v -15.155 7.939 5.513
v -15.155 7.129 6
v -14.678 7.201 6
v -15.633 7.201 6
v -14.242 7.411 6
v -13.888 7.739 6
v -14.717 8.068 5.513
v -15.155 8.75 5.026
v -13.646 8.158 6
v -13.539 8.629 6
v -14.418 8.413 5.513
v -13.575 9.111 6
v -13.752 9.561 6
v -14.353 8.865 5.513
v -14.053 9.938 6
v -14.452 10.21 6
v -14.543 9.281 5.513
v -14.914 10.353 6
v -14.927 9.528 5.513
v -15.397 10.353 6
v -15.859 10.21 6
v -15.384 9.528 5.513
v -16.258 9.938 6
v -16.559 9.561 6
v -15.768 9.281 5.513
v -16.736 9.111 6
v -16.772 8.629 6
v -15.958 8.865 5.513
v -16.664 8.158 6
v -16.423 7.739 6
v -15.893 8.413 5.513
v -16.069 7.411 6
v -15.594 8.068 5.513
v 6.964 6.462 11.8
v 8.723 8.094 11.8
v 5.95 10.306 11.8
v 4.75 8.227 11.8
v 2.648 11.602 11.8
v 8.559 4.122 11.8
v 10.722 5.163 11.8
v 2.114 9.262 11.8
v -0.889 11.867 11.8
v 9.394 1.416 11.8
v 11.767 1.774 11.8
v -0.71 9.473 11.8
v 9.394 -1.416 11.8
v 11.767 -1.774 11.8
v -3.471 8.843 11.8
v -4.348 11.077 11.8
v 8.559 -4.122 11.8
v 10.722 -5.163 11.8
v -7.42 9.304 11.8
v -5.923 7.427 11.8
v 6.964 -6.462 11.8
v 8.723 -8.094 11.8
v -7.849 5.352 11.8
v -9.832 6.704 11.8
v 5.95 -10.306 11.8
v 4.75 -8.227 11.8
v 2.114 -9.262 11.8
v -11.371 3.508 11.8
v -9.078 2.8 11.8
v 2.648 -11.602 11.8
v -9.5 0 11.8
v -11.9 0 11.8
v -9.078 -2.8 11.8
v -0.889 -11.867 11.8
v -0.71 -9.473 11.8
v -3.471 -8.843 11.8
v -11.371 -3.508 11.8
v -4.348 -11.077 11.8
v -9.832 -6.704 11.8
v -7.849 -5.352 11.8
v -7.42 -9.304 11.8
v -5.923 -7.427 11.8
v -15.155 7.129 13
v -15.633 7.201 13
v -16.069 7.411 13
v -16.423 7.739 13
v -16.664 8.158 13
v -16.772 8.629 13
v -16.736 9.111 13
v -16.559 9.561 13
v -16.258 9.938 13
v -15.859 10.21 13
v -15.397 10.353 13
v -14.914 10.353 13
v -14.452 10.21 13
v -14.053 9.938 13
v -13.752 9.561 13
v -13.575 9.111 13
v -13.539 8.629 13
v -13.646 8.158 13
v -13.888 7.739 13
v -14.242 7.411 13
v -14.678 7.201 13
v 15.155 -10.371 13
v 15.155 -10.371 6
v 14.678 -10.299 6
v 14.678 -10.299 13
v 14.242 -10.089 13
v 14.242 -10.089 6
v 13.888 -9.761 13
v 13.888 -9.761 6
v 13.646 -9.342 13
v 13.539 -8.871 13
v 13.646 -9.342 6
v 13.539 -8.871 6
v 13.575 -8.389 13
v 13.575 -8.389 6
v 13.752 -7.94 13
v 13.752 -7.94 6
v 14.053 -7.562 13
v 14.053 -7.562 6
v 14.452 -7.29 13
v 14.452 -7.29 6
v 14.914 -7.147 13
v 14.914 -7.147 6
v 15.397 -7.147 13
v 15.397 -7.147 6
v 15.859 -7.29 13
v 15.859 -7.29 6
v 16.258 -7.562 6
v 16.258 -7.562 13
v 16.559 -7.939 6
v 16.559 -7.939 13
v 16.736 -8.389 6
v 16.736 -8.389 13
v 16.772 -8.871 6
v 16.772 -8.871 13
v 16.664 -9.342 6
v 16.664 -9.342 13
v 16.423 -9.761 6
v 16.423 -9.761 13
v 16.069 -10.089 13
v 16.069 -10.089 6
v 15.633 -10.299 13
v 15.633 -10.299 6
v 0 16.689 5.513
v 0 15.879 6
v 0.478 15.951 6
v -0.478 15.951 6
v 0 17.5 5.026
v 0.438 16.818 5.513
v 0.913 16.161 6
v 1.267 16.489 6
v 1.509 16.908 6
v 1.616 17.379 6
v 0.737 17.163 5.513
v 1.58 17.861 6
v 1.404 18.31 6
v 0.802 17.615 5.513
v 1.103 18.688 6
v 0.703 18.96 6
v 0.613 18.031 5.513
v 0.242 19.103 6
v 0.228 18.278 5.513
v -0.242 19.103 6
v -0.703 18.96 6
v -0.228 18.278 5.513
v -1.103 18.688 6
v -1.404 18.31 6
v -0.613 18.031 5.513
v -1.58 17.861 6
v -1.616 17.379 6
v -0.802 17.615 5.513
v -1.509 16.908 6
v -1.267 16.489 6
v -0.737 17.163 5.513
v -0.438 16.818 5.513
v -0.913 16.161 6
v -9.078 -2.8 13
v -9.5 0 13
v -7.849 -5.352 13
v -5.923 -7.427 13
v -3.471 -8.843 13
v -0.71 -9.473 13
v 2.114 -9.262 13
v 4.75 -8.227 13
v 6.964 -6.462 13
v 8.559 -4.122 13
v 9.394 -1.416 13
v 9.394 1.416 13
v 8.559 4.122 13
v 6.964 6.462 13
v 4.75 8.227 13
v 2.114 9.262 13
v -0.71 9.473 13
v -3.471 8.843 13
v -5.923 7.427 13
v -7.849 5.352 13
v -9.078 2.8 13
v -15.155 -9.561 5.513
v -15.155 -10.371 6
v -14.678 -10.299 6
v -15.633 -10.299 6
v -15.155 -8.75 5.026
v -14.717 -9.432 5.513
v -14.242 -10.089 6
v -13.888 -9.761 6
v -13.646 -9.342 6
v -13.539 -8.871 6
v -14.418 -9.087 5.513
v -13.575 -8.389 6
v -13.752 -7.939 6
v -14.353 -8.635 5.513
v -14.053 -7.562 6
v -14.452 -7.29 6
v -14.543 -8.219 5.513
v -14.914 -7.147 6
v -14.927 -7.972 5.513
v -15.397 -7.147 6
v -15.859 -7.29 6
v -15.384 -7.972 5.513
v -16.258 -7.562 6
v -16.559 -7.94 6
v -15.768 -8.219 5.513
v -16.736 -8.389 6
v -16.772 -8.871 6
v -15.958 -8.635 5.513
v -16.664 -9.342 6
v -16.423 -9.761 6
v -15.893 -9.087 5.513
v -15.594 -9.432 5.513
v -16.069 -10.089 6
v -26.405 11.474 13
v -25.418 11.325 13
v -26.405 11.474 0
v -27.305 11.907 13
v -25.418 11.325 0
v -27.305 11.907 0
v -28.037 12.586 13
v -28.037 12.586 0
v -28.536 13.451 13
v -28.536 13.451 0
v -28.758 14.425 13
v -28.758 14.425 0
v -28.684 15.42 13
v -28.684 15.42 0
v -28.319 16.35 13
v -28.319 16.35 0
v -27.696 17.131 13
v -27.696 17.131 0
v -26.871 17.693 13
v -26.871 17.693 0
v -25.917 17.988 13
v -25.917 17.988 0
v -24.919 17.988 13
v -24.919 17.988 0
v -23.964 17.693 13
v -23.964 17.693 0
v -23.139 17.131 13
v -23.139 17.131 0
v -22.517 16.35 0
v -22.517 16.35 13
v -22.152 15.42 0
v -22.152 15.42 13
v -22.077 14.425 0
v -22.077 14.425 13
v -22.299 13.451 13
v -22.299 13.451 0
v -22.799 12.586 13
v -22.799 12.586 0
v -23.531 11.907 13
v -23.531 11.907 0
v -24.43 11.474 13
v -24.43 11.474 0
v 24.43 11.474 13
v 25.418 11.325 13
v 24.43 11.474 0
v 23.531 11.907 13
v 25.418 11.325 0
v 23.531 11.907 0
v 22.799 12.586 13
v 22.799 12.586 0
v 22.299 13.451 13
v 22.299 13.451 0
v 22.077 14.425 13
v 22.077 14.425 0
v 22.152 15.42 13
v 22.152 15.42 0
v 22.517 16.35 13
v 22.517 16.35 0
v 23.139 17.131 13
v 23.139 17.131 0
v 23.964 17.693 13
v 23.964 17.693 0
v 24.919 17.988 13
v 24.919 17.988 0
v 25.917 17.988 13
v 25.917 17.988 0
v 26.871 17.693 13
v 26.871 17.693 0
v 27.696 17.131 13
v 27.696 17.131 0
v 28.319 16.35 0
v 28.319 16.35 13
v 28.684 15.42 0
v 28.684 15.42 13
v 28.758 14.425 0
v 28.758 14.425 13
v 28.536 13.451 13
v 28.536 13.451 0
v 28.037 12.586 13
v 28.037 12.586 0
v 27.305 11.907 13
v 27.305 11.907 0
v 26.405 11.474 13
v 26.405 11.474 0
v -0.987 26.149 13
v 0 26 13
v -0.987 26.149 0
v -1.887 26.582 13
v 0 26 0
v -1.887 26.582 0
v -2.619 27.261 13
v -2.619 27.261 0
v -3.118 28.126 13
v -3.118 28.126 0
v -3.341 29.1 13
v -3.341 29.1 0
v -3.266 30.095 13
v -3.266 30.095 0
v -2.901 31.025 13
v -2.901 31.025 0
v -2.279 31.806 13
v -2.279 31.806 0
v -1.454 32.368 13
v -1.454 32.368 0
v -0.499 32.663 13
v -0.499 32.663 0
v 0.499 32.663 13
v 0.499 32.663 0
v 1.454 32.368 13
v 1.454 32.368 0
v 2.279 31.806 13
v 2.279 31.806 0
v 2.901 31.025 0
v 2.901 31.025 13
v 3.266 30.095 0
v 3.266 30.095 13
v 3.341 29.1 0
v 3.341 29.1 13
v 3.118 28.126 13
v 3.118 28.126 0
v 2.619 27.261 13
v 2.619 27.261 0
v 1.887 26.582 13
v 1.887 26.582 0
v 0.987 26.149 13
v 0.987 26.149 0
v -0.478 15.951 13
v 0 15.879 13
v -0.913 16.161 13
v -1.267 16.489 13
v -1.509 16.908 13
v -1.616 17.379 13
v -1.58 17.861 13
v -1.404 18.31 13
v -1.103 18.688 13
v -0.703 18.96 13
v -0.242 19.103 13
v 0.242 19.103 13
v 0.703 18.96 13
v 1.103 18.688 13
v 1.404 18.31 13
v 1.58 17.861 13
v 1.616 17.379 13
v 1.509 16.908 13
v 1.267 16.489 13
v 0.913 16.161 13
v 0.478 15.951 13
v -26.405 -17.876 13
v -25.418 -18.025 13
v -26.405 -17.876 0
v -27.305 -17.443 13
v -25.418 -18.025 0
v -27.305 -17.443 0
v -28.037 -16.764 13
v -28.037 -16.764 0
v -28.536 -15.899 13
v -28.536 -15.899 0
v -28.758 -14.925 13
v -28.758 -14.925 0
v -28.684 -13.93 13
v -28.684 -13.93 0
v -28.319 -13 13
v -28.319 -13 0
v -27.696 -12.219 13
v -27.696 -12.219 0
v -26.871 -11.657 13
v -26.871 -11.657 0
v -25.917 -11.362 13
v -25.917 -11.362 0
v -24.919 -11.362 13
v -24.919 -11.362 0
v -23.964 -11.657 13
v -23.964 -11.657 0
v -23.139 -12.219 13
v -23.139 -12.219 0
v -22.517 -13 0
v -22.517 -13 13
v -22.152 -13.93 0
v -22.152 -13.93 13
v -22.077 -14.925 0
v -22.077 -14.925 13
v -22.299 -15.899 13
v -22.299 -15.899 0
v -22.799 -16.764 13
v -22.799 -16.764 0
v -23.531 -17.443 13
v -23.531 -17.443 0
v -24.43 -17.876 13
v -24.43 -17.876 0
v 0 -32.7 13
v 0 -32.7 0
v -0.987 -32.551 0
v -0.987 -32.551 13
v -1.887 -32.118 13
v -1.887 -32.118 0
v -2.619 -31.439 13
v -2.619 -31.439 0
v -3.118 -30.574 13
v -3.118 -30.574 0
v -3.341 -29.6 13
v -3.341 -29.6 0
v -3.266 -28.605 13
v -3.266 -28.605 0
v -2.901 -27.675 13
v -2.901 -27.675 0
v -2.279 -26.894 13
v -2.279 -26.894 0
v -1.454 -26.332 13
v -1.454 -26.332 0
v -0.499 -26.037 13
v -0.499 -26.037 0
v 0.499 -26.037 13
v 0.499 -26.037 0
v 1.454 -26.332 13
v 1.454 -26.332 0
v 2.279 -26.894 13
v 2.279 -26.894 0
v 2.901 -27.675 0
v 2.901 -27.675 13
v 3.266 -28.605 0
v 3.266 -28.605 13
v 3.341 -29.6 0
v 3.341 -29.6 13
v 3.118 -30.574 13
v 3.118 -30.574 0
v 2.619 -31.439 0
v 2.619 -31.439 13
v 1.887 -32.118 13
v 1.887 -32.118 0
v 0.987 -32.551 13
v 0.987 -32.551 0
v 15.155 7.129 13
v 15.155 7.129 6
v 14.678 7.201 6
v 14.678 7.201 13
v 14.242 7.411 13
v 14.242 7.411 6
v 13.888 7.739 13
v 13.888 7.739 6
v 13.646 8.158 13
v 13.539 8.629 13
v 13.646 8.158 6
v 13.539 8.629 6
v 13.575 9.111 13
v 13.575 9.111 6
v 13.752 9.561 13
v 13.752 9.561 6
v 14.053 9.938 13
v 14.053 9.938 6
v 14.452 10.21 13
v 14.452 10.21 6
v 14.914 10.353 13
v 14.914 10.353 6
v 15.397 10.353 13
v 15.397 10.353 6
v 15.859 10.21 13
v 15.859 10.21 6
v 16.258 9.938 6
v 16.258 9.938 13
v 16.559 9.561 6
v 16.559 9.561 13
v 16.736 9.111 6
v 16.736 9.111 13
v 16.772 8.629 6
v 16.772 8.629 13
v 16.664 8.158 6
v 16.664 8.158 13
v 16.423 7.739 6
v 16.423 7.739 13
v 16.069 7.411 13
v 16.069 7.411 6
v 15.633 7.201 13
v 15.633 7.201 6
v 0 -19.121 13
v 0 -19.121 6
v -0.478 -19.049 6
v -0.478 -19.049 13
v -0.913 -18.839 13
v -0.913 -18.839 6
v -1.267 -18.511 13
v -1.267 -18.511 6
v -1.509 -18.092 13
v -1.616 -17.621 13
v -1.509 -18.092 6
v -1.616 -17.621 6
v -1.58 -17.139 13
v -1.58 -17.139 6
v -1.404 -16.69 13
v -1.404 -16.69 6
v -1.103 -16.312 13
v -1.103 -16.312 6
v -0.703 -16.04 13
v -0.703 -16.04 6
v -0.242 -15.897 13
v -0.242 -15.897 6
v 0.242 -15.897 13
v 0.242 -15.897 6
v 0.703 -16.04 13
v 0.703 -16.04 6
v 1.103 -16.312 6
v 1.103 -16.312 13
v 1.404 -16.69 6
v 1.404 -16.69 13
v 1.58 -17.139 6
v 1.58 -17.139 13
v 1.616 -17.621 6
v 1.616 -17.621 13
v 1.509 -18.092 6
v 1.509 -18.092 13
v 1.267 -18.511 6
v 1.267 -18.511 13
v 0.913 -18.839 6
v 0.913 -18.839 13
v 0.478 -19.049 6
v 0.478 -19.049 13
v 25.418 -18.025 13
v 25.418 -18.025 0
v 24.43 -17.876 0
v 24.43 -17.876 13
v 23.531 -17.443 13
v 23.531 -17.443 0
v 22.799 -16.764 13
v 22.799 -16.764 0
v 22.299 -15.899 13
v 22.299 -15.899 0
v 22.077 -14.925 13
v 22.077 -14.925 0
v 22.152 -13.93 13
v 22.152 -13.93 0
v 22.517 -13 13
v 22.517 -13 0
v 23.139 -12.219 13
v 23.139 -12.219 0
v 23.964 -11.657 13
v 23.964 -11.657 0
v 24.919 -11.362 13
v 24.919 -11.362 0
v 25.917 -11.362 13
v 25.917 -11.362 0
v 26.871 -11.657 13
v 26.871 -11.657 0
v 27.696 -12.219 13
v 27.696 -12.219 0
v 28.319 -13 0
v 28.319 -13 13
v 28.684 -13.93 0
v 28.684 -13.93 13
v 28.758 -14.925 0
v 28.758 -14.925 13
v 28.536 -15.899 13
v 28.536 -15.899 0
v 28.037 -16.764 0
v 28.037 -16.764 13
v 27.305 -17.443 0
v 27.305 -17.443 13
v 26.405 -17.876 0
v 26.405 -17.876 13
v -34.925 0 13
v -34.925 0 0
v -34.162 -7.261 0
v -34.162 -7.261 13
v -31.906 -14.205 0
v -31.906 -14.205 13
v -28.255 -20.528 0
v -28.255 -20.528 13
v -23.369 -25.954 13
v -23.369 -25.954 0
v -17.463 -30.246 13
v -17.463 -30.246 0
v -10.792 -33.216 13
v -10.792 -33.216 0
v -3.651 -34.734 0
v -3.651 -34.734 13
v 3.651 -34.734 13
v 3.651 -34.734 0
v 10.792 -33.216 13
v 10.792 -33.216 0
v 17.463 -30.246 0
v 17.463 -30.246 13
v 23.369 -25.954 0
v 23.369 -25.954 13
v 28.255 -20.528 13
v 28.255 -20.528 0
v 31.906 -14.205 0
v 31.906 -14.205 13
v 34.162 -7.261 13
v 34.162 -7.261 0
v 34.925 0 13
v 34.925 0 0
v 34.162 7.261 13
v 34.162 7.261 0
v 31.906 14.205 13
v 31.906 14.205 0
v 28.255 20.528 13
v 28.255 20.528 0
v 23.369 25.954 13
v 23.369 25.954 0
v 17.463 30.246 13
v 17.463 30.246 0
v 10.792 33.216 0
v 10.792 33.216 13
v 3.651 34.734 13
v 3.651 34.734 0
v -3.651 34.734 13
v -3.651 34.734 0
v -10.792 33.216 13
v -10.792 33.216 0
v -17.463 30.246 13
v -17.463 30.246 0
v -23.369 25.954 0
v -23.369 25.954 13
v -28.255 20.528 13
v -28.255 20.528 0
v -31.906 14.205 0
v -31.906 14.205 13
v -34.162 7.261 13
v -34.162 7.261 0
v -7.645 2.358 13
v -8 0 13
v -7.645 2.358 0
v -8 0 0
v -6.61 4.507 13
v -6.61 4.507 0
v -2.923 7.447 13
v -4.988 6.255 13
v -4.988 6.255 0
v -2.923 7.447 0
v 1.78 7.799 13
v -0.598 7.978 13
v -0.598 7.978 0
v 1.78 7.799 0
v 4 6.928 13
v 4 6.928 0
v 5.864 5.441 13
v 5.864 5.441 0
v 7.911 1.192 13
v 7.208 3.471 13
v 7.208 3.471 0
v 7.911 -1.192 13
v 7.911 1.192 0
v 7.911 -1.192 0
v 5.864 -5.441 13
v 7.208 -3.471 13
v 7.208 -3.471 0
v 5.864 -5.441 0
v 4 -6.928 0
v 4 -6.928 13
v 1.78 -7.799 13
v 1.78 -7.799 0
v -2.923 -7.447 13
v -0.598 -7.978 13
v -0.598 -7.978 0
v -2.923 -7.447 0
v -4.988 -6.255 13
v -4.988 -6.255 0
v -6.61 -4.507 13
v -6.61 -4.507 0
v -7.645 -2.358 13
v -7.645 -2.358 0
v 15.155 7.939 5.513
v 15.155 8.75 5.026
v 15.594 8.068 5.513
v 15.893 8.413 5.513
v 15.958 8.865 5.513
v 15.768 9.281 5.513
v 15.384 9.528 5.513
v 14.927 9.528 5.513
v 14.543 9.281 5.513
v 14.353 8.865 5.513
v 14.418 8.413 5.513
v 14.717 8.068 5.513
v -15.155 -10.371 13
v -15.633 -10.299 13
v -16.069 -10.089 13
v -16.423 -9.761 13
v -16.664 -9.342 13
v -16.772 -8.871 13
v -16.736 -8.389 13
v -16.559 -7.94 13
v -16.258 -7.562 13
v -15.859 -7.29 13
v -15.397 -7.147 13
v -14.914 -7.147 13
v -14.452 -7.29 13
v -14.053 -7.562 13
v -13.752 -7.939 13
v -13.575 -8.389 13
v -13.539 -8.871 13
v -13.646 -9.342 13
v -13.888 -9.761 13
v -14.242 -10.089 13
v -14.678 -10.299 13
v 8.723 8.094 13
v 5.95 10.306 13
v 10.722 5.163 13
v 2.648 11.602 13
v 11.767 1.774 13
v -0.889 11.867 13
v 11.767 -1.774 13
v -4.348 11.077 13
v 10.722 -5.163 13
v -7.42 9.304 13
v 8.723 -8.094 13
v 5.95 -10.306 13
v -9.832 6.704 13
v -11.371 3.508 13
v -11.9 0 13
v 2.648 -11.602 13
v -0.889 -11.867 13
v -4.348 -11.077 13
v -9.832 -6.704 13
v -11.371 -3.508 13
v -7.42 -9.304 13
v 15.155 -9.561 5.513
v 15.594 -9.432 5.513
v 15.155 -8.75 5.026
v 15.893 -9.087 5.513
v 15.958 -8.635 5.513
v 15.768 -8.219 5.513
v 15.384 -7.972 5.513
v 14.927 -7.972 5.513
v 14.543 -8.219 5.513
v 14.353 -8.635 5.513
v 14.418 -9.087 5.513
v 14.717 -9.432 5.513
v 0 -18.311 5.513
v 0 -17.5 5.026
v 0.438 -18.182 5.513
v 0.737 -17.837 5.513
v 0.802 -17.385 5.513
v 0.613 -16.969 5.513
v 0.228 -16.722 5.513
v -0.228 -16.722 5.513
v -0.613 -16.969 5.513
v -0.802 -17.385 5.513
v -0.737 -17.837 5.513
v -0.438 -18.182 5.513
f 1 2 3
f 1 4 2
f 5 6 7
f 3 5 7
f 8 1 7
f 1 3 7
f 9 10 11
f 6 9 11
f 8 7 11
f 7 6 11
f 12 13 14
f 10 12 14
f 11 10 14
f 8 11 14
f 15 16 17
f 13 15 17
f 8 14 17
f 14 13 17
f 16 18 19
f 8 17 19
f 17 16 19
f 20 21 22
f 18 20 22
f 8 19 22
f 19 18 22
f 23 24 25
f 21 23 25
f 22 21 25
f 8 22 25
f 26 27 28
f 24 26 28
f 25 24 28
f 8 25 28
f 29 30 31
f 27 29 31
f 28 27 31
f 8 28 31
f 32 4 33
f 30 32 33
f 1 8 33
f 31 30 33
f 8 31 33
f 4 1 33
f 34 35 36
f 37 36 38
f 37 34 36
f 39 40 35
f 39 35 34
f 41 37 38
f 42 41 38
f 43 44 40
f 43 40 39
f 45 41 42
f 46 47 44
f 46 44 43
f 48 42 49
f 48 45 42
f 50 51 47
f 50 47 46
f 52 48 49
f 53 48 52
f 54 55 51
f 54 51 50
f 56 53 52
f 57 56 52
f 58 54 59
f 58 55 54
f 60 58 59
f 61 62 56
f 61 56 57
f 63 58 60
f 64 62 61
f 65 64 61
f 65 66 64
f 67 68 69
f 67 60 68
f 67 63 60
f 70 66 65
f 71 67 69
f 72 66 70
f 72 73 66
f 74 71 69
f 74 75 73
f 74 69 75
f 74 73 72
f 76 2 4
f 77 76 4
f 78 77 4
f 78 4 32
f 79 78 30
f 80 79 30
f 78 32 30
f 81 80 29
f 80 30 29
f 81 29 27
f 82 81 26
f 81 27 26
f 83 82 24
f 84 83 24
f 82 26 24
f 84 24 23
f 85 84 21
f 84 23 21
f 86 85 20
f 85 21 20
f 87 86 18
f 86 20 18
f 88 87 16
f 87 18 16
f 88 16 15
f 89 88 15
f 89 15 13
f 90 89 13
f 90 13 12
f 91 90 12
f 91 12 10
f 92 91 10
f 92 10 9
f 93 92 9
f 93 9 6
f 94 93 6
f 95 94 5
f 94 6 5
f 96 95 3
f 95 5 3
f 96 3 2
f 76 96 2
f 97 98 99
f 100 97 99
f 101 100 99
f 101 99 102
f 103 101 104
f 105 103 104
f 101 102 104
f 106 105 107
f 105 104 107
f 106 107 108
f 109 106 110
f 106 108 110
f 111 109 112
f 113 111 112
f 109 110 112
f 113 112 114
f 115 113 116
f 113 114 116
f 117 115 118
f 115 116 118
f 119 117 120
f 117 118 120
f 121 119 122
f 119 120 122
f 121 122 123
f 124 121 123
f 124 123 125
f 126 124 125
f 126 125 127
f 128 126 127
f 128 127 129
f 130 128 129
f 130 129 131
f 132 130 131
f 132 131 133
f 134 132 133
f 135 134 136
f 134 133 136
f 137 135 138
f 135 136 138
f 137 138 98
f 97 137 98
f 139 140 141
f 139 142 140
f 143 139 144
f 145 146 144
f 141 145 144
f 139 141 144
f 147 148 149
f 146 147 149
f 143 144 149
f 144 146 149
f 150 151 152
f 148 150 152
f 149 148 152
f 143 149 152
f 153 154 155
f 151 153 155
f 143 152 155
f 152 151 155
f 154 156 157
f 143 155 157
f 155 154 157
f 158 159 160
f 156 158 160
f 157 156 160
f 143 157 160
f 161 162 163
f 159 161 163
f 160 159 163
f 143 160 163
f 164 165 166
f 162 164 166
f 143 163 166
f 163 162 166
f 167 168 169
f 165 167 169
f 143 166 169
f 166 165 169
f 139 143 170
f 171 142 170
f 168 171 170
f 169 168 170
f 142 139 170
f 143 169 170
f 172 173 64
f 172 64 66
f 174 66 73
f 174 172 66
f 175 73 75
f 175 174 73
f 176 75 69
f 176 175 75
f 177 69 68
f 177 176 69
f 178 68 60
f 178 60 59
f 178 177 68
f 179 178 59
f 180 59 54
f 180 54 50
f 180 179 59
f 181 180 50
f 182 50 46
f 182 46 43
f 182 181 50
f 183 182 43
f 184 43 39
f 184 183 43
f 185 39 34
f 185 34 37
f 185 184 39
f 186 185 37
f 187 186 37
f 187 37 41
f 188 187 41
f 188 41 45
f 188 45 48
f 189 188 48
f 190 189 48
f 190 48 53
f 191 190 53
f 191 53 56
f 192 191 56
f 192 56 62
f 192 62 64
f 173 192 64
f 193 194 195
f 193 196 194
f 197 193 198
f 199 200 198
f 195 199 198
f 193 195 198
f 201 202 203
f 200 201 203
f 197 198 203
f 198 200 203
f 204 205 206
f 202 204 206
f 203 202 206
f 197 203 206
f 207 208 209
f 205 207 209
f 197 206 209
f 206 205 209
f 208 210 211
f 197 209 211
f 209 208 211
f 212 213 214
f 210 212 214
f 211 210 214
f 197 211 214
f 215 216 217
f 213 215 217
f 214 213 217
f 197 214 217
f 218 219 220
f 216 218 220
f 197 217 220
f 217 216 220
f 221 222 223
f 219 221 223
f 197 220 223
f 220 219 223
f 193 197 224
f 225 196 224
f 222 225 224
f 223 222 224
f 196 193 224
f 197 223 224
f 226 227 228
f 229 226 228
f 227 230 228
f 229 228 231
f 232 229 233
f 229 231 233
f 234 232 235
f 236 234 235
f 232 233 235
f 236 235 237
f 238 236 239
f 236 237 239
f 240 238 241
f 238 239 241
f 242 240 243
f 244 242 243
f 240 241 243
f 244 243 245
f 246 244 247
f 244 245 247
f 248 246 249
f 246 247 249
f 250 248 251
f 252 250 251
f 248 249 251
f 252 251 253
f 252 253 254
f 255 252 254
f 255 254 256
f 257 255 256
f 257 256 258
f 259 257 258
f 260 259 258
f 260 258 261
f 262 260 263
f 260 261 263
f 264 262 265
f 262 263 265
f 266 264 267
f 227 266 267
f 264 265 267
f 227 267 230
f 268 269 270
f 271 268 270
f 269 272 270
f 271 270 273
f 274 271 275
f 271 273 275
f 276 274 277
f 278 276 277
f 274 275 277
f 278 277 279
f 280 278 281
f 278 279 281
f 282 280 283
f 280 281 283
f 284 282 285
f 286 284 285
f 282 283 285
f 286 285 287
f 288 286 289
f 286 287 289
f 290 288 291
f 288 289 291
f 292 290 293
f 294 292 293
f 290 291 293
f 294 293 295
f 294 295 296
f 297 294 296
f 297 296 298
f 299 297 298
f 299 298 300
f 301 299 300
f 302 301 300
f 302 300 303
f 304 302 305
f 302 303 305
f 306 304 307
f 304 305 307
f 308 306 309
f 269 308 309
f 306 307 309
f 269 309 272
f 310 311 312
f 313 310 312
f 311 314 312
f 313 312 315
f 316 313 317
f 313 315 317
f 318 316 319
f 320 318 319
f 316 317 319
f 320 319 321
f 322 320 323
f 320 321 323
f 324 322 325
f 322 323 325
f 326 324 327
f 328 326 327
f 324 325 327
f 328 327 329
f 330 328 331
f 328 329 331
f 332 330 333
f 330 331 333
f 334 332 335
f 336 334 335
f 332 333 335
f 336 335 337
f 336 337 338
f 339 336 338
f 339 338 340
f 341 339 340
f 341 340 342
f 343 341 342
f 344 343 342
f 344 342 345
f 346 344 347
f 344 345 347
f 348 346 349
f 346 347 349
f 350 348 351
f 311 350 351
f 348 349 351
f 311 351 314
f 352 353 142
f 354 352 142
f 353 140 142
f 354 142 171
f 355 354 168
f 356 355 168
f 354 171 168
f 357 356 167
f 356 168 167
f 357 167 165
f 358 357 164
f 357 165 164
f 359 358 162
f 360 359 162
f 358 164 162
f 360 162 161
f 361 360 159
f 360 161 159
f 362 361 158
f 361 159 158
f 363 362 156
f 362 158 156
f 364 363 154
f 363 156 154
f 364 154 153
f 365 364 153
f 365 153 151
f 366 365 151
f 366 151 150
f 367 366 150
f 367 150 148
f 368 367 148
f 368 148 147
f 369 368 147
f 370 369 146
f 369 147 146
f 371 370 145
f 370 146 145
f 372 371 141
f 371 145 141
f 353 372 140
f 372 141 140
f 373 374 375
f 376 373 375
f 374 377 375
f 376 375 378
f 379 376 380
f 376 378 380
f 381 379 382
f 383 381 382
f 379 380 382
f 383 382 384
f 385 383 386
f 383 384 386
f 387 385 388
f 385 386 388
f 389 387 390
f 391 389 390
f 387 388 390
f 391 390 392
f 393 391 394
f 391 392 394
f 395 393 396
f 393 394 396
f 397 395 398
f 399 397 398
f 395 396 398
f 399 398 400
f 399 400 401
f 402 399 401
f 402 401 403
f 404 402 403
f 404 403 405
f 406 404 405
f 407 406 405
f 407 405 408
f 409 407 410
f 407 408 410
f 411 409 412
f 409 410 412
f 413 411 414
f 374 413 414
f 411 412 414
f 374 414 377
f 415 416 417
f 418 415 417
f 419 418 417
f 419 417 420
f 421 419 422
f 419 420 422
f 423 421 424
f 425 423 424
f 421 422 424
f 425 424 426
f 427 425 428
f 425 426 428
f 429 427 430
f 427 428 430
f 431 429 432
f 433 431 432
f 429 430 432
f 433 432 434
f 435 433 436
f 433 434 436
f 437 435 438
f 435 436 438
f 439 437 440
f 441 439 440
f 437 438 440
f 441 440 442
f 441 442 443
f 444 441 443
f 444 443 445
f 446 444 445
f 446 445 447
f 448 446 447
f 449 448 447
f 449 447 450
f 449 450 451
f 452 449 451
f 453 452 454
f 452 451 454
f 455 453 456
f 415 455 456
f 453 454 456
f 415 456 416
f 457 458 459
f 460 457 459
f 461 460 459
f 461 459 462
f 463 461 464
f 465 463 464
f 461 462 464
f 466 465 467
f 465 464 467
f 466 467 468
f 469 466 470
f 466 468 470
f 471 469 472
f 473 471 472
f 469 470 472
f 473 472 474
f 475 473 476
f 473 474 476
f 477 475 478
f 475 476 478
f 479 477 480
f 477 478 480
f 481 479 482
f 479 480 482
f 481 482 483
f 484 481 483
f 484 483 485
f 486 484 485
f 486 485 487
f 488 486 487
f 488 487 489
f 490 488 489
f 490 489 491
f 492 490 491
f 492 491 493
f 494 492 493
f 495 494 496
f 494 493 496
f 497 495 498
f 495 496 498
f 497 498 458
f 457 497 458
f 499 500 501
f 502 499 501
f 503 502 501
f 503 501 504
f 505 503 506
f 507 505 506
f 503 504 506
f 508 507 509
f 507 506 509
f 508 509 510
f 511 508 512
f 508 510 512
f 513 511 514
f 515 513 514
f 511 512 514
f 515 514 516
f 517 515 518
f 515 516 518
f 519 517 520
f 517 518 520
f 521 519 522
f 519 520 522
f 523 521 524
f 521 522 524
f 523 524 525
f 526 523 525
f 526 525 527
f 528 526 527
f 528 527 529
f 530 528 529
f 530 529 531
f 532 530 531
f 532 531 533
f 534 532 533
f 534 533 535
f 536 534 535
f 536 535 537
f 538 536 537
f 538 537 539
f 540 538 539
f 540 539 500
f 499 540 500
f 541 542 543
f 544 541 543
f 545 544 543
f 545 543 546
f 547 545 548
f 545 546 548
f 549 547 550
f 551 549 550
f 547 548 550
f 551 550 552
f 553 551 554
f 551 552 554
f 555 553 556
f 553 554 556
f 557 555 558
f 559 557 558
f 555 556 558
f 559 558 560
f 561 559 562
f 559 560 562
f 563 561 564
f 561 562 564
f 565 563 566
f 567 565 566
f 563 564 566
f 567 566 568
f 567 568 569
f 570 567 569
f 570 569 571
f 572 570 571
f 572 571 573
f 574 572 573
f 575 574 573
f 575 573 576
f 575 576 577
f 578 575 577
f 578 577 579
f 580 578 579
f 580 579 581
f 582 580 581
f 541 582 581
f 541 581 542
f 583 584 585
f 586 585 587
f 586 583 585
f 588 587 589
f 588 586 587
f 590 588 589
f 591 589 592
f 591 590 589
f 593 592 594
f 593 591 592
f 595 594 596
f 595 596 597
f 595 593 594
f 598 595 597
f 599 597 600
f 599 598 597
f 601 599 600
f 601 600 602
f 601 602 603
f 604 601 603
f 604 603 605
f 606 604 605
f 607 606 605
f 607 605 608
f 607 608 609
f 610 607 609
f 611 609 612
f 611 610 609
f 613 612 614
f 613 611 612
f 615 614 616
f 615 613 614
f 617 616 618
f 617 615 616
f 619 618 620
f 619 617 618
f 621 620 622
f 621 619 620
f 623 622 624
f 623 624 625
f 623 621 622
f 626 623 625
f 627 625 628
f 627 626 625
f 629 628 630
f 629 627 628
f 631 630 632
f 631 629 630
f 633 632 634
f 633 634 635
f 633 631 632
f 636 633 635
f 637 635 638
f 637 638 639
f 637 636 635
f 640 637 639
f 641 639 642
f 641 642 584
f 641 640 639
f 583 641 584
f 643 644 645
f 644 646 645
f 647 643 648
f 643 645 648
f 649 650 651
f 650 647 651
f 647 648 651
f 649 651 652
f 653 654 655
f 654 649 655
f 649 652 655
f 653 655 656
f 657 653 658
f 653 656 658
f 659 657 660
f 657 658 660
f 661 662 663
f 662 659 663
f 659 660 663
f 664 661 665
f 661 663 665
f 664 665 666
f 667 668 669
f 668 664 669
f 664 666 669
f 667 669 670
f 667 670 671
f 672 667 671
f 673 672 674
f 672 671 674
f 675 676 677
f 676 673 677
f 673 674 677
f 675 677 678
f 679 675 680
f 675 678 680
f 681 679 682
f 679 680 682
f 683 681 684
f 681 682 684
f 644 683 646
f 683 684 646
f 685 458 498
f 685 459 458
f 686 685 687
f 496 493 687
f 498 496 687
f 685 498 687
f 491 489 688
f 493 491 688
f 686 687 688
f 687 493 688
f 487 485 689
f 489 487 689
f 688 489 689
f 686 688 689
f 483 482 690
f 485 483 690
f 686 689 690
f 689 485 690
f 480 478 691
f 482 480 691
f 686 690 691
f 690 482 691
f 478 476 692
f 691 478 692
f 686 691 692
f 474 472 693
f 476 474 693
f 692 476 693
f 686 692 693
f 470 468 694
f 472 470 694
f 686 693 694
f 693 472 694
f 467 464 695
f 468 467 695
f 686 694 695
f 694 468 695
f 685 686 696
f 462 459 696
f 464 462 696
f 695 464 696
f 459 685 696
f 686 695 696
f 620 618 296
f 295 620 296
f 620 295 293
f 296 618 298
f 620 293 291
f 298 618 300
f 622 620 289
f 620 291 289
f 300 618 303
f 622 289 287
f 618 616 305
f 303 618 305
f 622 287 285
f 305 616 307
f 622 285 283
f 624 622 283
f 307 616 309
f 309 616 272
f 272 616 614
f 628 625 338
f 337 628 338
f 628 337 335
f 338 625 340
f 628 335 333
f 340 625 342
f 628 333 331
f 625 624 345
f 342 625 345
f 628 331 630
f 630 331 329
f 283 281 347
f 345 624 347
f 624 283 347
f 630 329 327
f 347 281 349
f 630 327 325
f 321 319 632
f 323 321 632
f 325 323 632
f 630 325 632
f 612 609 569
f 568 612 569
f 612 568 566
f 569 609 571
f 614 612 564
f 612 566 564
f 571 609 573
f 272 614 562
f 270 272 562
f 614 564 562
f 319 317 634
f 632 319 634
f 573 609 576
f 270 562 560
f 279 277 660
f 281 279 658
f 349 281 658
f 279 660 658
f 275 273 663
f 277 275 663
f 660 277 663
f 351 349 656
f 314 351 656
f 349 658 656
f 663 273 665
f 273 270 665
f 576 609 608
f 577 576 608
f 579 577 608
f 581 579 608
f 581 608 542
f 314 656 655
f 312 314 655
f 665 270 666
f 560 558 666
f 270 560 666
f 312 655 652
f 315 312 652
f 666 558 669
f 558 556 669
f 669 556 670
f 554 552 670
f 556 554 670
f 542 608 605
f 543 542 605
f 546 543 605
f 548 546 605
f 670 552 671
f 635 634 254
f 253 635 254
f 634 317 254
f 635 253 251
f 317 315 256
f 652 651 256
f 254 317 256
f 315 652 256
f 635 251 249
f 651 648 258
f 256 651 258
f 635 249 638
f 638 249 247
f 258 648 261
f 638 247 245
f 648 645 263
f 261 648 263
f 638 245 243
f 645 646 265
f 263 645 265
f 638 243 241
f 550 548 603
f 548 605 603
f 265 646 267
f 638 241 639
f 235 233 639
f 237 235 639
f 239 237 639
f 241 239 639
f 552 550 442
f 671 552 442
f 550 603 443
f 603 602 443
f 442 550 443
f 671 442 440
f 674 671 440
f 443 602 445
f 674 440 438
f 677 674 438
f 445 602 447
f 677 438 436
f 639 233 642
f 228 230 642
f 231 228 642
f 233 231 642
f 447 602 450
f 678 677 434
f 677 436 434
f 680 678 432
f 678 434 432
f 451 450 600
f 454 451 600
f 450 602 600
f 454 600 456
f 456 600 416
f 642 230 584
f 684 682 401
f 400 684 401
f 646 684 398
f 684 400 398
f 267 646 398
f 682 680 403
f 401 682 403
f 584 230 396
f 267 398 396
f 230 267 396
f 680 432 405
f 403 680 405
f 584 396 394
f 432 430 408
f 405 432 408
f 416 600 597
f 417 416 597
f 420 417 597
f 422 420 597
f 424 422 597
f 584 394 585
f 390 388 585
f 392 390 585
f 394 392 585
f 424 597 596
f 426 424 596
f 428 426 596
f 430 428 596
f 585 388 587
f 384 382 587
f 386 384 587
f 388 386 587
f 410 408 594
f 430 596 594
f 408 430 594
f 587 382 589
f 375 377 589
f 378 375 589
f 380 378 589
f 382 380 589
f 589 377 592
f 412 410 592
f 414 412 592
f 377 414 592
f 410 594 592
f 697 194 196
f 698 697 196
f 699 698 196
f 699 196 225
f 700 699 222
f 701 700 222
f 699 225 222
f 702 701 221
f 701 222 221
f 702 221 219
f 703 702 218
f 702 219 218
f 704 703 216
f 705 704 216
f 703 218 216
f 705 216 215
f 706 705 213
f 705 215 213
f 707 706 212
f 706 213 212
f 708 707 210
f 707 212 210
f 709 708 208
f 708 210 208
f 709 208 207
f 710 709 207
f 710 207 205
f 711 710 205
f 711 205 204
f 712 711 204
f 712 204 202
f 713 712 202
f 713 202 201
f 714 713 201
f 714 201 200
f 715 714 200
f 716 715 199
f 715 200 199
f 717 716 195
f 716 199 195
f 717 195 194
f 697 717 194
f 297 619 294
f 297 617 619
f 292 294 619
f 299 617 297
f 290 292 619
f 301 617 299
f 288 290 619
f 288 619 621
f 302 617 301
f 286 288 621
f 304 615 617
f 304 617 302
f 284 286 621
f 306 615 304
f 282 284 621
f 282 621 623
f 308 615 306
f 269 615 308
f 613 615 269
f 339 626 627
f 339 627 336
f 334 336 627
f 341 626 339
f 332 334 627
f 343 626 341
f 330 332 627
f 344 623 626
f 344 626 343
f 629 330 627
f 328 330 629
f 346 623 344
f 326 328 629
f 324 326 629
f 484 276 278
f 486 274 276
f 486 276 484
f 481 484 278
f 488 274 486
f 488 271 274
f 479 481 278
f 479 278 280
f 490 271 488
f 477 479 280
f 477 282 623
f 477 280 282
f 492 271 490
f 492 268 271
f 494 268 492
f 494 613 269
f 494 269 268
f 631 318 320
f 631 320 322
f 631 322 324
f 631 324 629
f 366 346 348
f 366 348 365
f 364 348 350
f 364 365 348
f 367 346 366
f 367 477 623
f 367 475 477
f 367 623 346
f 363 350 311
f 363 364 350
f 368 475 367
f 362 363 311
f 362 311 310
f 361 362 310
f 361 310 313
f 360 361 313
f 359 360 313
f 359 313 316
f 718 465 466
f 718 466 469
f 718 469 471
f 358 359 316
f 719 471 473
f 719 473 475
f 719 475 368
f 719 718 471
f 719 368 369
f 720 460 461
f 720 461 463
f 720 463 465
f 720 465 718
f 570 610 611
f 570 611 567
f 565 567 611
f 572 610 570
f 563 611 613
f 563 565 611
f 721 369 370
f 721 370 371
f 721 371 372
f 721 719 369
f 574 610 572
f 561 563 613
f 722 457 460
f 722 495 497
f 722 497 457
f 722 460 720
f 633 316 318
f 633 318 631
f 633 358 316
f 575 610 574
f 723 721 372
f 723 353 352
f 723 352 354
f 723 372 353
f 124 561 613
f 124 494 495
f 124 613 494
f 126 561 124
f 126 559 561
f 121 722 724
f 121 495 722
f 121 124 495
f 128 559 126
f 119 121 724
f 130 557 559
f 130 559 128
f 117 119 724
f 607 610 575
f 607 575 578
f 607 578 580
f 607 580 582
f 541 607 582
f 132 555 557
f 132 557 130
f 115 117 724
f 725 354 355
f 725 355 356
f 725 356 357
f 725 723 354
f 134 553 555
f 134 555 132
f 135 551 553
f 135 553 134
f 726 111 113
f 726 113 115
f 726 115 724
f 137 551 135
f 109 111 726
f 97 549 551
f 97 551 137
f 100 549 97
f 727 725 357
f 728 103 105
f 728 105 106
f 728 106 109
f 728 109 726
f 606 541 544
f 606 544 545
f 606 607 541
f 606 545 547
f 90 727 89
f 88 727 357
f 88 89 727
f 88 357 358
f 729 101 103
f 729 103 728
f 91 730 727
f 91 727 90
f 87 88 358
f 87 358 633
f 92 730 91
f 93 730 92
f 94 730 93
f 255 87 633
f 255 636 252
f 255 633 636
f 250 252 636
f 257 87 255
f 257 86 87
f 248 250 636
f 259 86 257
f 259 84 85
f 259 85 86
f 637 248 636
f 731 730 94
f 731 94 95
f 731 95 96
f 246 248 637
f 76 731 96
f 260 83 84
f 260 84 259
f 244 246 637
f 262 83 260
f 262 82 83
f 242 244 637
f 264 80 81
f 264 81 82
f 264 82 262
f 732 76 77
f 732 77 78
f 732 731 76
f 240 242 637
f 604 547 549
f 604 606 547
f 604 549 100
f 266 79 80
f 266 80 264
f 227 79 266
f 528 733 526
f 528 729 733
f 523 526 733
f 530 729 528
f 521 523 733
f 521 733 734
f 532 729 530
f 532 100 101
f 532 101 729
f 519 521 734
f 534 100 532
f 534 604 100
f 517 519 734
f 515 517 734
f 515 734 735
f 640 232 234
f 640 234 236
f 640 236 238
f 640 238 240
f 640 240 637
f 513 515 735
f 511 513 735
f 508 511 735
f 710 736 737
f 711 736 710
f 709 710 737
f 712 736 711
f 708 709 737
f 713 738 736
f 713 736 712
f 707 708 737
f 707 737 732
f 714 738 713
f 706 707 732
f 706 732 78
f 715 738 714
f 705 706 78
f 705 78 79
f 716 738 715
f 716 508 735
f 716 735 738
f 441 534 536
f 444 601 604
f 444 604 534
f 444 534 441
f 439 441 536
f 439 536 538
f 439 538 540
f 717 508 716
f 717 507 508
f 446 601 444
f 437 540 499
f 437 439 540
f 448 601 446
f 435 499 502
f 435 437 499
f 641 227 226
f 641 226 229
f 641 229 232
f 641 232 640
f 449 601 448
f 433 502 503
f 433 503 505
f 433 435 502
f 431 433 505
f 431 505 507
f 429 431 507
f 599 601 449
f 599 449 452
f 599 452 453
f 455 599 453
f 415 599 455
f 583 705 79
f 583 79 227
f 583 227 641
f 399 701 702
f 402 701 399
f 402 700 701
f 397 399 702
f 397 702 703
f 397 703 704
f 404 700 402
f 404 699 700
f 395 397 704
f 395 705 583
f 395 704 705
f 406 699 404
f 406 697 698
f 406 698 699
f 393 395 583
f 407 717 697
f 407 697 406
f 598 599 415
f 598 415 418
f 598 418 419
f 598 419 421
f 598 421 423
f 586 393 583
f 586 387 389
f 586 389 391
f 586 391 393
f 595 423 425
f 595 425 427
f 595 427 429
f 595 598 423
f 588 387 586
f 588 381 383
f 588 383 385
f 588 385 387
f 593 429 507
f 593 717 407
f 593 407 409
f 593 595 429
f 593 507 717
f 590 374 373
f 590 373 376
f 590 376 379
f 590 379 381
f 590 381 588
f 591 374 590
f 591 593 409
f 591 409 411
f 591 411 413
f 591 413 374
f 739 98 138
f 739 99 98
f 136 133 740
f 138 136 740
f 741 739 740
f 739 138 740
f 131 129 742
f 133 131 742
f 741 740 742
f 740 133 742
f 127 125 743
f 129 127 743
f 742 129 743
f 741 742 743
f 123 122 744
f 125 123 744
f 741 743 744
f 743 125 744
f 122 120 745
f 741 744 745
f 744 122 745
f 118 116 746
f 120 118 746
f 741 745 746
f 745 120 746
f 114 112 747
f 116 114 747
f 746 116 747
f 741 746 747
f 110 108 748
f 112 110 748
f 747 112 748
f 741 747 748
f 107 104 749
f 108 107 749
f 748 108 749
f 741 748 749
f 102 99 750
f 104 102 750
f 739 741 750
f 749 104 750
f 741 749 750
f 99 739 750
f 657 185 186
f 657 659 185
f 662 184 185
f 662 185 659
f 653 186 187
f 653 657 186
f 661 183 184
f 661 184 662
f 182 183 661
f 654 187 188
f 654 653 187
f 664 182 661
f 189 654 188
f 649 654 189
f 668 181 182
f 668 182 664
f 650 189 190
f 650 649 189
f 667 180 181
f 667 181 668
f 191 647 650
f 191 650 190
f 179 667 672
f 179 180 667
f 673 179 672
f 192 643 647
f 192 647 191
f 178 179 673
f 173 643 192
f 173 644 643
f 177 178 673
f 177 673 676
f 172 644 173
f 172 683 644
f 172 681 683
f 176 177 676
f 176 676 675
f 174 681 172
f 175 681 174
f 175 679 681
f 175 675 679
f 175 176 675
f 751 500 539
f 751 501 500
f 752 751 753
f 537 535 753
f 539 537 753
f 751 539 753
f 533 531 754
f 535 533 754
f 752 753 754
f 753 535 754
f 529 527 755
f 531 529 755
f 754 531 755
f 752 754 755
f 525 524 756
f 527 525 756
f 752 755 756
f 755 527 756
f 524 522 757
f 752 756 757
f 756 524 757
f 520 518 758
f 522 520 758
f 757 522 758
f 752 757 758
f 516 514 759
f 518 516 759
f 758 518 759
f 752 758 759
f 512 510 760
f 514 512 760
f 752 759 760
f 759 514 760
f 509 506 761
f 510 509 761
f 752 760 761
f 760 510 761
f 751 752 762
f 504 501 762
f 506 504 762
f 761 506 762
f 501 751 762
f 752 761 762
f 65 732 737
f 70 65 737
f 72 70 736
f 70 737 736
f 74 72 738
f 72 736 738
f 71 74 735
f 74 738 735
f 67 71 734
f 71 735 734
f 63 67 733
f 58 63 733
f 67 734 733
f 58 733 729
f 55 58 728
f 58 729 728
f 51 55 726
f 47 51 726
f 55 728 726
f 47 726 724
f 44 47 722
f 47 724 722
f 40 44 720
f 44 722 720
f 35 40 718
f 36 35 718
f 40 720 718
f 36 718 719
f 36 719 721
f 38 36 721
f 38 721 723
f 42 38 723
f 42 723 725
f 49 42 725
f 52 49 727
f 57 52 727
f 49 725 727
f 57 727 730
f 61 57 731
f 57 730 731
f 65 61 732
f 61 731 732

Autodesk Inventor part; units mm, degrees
ref_plane "YZ Plane" through (0, 0, 0) normal (1, 0, 0) x (0, 1, 0)
ref_plane "XZ Plane" through (0, 0, 0) normal (0, 1, 0) x (-1, 0, 0)
ref_plane "XY Plane" through (0, 0, 0) normal (0, 0, 1) x (1, 0, 0)
sketch "Sketch5" plane through (0, 0, 0) normal (0, 1, 0) x (-1, 0, 0)
  line L0 (-22.5, 13) -> (22.5, 13) construction
  line L1 (8, 13) -> (8, 0)
  line L2 (8, 0) -> (34.925, 0)
  line L3 (34.925, 0) -> (34.925, 13)
  line L4 (34.925, 13) -> (11.9, 13)
  line L5 (11.9, 11.8) -> (9.5, 11.8)
  line L6 (9.5, 11.8) -> (9.5, 13)
  line L7 (11.9, 11.8) -> (11.9, 13)
  line L8 (0, -1.501) -> (0, 14.3549) construction
  line L9 (8, 13) -> (9.5, 13)
  dimension "d38" = 13
  dimension "d39" = 8
  dimension "d40" = 9.5
  dimension "d41" = 2.4
  dimension "d42" = 1.2
  dimension "d43" = 34.925
ref_plane "Work Plane1" through (0, 0, 13) normal (0, 0, -1) x (-1, 0, 0)
revolve "Revolution1" add sketch "Sketch5" angle 360 about axis through (0, 0, -1.501) along (0, 0, 1)
sketch "Sketch9" plane through (0, 0, 13) normal (0, 0, 1) x (1, 0, 0)
  circle A0 centre (0, 0) radius 11.9 projected
  circle A1 centre (0, 0) radius 17.5
  circle A2 centre (0, 0) radius 17.5
  circle A3 centre (0, 0) radius 17.5
  circle A4 centre (0, 0) radius 17.5
  circle A5 centre (0, 0) radius 17.5
  circle A6 centre (0, 0) radius 17.5
  point P0 (0, 17.5)
  point P1 (-15.1554, 8.75)
  point P2 (-15.1554, -8.75)
  point P3 (0, -17.5)
  point P4 (15.1554, -8.75)
  point P5 (15.1554, 8.75)
  dimension "d75" = 35
  dimension "d78" = 360
hole "Hole6" at (0, 17.5, 13) at (-15.1554, 8.75, 13) at (-15.1554, -8.75, 13) at (0, -17.5, 13) at (15.1554, -8.75, 13) at (15.1554, 8.75, 13) direction (0, 0, -1) diameter 3.242 depth 7 tip angle 118 thread size "M4x0.7" class "6H" standard "ISO Metric profile"
sketch "Sketch10" plane through (0, 0, 13) normal (0, 0, 1) x (1, 0, 0)
  circle A0 centre (0, 0) radius 11.9 projected
  circle A1 centre (0, 0) radius 29.35
  point P0 (0, 29.35)
  point P1 (-25.4178, 14.675)
  point P2 (-25.4178, -14.675)
  point P3 (0, -29.35)
  point P4 (25.4178, -14.675)
  point P5 (25.4178, 14.675)
  dimension "d87" = 58.7
  dimension "d90" = 360
hole "Hole7" at (0, 29.35, 13) at (-25.4178, 14.675, 13) at (-25.4178, -14.675, 13) at (0, -29.35, 13) at (25.4178, -14.675, 13) at (25.4178, 14.675, 13) direction (0, 0, -1) diameter 6.7 end through all
properties part number "Conflat Flange"
